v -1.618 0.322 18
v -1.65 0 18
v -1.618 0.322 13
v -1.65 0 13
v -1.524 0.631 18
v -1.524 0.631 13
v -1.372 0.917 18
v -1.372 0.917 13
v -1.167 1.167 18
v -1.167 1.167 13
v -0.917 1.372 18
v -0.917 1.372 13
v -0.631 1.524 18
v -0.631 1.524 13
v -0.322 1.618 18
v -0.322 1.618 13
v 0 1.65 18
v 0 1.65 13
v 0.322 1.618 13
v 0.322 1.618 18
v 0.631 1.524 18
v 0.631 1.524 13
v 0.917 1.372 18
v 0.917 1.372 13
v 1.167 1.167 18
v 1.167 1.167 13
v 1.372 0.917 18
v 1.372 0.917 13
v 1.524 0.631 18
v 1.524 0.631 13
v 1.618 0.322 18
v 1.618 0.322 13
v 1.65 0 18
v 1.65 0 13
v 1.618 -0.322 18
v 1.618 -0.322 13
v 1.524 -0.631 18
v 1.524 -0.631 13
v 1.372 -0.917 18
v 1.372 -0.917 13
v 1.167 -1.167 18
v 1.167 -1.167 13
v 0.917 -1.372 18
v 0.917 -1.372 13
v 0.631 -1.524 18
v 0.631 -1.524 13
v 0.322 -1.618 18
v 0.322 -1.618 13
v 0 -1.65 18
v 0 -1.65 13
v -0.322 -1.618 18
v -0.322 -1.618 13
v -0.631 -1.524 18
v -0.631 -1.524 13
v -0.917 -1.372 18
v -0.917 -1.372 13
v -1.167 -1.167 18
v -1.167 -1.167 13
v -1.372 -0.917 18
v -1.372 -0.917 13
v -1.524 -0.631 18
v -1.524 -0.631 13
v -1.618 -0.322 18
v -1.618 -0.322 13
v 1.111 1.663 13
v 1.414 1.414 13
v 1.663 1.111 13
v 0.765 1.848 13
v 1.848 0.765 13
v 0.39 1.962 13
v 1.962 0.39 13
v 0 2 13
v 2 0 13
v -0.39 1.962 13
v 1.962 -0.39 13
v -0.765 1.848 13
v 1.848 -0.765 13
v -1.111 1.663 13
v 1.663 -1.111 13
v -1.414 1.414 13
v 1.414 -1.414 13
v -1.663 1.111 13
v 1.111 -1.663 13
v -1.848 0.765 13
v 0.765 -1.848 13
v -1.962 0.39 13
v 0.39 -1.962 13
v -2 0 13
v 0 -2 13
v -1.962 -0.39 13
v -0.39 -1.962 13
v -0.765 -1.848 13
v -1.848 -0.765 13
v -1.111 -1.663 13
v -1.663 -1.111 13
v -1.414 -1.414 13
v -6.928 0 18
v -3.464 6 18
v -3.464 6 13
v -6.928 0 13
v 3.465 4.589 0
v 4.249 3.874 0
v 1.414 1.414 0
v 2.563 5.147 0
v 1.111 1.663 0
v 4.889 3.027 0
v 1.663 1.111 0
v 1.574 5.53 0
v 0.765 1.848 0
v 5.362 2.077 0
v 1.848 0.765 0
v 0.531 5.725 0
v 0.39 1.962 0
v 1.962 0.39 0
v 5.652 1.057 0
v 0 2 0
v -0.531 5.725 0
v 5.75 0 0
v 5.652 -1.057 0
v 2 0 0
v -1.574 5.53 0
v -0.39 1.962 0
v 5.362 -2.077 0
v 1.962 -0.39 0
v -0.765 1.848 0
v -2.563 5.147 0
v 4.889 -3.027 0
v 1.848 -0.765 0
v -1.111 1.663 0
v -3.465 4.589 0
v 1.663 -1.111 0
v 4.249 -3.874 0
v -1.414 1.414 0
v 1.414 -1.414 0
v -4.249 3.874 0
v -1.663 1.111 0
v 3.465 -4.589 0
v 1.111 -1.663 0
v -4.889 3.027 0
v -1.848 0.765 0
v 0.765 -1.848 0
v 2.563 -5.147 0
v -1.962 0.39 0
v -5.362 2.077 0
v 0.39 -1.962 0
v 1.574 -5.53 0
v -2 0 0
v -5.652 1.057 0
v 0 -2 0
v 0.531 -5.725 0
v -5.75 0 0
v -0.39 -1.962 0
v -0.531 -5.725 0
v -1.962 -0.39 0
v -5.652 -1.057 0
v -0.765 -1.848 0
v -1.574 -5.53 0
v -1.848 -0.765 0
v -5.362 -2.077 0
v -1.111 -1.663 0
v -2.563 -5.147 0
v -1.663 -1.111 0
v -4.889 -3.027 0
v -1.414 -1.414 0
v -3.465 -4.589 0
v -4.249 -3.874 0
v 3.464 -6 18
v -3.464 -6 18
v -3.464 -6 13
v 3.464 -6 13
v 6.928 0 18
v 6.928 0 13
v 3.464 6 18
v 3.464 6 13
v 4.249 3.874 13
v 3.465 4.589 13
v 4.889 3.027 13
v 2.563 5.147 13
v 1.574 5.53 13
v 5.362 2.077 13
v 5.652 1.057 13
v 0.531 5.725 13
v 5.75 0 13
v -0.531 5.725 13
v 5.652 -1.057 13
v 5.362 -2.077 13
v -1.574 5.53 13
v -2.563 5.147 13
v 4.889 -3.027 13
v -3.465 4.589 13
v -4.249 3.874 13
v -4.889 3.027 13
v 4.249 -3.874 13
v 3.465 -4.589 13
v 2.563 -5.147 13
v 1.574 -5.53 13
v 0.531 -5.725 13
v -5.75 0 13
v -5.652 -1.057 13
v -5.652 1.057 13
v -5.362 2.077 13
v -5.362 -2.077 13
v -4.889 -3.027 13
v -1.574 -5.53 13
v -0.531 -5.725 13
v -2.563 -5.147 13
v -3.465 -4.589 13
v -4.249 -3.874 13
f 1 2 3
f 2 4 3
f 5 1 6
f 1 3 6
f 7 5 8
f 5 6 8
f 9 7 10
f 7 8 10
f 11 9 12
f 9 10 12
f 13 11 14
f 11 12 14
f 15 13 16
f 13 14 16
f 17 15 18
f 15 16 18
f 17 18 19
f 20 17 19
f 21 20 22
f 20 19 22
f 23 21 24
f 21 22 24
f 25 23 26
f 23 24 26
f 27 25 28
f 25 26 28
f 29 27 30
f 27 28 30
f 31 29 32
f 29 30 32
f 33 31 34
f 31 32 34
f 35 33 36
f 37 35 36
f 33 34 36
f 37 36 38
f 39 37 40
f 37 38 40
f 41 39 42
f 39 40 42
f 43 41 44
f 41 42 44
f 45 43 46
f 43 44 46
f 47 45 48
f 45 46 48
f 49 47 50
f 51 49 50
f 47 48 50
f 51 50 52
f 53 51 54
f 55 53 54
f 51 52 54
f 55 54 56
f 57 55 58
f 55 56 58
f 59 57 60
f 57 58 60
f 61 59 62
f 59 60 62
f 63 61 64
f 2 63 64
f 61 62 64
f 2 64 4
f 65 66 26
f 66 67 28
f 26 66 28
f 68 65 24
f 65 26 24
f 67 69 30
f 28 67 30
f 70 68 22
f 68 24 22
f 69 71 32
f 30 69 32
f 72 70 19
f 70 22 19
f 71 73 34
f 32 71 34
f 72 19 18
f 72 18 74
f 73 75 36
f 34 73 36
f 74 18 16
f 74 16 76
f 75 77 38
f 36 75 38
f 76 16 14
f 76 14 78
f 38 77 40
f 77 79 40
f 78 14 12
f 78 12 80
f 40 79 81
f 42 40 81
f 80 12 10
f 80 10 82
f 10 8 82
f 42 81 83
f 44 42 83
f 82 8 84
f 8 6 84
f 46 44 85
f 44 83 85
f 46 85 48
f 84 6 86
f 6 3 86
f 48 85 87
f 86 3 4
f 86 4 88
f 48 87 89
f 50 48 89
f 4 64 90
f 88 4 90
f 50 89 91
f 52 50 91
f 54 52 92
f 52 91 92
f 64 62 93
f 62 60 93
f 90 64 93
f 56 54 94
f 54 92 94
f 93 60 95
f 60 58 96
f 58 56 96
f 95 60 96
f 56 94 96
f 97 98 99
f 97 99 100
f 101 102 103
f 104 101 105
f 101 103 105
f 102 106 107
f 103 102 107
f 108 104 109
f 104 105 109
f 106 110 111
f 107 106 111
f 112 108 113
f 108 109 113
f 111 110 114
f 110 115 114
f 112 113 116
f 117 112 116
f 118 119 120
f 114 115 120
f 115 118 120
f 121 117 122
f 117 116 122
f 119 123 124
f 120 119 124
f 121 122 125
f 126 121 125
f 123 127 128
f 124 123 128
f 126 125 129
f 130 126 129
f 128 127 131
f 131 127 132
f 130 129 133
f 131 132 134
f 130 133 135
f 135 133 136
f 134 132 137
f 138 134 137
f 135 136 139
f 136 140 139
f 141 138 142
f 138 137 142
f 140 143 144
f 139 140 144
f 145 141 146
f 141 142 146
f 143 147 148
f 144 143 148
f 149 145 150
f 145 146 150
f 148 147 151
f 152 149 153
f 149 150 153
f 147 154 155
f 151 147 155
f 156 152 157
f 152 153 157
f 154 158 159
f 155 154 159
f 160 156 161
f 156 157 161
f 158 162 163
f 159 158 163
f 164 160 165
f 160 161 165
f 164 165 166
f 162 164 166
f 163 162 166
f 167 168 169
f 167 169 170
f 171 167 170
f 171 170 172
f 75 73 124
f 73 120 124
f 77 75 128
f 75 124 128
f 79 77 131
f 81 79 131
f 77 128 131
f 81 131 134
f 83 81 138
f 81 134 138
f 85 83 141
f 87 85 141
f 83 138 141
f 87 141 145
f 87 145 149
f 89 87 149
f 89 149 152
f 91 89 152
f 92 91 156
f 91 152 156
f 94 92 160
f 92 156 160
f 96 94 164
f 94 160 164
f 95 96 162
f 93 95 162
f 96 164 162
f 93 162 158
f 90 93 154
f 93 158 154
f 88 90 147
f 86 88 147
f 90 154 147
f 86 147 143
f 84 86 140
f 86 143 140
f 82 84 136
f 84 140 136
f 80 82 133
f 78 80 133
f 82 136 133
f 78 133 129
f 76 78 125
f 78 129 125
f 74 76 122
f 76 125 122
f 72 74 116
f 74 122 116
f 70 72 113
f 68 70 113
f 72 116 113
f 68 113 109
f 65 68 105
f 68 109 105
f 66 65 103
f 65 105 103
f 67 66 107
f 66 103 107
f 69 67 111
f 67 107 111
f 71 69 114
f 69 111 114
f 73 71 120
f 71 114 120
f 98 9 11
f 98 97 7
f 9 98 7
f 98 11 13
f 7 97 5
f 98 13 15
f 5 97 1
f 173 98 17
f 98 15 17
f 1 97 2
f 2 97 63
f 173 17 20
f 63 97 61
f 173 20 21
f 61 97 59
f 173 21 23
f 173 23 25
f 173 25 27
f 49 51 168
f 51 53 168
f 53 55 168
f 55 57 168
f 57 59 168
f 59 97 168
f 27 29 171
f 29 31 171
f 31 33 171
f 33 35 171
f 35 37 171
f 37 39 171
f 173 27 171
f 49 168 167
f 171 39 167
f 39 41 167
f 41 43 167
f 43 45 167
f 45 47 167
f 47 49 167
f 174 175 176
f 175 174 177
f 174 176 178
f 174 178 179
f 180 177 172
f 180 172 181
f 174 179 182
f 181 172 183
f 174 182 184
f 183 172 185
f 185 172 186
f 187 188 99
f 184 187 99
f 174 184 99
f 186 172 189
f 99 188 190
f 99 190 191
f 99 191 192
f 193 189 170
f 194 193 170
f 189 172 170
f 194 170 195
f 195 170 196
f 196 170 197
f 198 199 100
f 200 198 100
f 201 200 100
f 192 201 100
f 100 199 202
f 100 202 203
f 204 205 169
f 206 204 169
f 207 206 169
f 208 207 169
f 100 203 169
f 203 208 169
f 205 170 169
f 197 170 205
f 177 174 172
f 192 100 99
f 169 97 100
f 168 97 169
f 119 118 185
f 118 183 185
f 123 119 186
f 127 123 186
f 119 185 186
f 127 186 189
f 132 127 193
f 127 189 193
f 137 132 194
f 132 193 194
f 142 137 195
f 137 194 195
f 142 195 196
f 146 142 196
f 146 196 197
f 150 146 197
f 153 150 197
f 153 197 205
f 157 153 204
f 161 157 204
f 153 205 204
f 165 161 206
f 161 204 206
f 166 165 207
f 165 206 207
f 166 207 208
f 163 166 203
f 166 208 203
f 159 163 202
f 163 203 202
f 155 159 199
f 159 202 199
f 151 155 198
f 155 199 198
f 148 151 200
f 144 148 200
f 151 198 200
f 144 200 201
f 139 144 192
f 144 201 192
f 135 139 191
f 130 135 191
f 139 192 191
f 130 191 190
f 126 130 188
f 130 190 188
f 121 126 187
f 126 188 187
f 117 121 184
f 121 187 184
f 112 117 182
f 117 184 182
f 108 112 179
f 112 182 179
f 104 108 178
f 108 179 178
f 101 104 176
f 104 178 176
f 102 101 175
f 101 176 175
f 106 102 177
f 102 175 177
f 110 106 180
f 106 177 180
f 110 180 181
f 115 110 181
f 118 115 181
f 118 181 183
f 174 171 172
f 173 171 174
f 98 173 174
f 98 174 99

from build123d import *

# Parameters (mm, degrees)
TAP_DRILL_FOR_M4X0_7_TAP1_D     = 3.3
TAP_DRILL_FOR_M4X0_7_TAP1_DEPTH = 5
TAP_DRILL_FOR_M4X0_7_TAP1_TIP   = 0.991420021
SKETCH9_OUTSIDE_W               = 25.62
SKETCH9_OUTSIDE_H               = 25.62
CUT_EXTRUDE1_DEPTH              = 22.843191159


with BuildPart() as part:
    # Sketch1 → Revolve1 (revolve)
    with BuildSketch(Plane(origin=(0, 0, 0), x_dir=(0, 0, -1), z_dir=(1, 0, 0)), mode=Mode.PRIVATE) as revolve1_sk:
        Polygon((0, -2), (0, -5.75), (-13, -5.75), (-13, -8.75), (-18, -8.75), (-18, 0), (-13, 0), (-13, -2), align=None)
    revolve(revolve1_sk.sketch.rotate(Axis((0, 0, 36.965240676), (0, 0, -1)), 270), axis=Axis((0, 0, 36.965240676), (0, 0, -1)))

    # Tap Drill for M4x0.7 Tap1
    with Locations(Plane.XY.offset(18)):
        with Locations((0, 0)):
            Hole(TAP_DRILL_FOR_M4X0_7_TAP1_D / 2, depth=TAP_DRILL_FOR_M4X0_7_TAP1_DEPTH)
            with Locations((0, 0, -(TAP_DRILL_FOR_M4X0_7_TAP1_DEPTH + TAP_DRILL_FOR_M4X0_7_TAP1_TIP / 2))):  # 118° drill point
                Cone(0, TAP_DRILL_FOR_M4X0_7_TAP1_D / 2, TAP_DRILL_FOR_M4X0_7_TAP1_TIP, mode=Mode.SUBTRACT)

    # Sketch9 outside → Cut-Extrude1 (cut, through all)
    with BuildSketch(Plane.XY.offset(18)):
        Rectangle(SKETCH9_OUTSIDE_W, SKETCH9_OUTSIDE_H)
        Polygon((3.464101615, -6), (6.92820323, 0), (3.464101615, 6), (-3.464101615, 6), (-6.92820323, 0), (-3.464101615, -6), align=None, mode=Mode.SUBTRACT)
    extrude(amount=-CUT_EXTRUDE1_DEPTH, mode=Mode.SUBTRACT)


solid = part.part
